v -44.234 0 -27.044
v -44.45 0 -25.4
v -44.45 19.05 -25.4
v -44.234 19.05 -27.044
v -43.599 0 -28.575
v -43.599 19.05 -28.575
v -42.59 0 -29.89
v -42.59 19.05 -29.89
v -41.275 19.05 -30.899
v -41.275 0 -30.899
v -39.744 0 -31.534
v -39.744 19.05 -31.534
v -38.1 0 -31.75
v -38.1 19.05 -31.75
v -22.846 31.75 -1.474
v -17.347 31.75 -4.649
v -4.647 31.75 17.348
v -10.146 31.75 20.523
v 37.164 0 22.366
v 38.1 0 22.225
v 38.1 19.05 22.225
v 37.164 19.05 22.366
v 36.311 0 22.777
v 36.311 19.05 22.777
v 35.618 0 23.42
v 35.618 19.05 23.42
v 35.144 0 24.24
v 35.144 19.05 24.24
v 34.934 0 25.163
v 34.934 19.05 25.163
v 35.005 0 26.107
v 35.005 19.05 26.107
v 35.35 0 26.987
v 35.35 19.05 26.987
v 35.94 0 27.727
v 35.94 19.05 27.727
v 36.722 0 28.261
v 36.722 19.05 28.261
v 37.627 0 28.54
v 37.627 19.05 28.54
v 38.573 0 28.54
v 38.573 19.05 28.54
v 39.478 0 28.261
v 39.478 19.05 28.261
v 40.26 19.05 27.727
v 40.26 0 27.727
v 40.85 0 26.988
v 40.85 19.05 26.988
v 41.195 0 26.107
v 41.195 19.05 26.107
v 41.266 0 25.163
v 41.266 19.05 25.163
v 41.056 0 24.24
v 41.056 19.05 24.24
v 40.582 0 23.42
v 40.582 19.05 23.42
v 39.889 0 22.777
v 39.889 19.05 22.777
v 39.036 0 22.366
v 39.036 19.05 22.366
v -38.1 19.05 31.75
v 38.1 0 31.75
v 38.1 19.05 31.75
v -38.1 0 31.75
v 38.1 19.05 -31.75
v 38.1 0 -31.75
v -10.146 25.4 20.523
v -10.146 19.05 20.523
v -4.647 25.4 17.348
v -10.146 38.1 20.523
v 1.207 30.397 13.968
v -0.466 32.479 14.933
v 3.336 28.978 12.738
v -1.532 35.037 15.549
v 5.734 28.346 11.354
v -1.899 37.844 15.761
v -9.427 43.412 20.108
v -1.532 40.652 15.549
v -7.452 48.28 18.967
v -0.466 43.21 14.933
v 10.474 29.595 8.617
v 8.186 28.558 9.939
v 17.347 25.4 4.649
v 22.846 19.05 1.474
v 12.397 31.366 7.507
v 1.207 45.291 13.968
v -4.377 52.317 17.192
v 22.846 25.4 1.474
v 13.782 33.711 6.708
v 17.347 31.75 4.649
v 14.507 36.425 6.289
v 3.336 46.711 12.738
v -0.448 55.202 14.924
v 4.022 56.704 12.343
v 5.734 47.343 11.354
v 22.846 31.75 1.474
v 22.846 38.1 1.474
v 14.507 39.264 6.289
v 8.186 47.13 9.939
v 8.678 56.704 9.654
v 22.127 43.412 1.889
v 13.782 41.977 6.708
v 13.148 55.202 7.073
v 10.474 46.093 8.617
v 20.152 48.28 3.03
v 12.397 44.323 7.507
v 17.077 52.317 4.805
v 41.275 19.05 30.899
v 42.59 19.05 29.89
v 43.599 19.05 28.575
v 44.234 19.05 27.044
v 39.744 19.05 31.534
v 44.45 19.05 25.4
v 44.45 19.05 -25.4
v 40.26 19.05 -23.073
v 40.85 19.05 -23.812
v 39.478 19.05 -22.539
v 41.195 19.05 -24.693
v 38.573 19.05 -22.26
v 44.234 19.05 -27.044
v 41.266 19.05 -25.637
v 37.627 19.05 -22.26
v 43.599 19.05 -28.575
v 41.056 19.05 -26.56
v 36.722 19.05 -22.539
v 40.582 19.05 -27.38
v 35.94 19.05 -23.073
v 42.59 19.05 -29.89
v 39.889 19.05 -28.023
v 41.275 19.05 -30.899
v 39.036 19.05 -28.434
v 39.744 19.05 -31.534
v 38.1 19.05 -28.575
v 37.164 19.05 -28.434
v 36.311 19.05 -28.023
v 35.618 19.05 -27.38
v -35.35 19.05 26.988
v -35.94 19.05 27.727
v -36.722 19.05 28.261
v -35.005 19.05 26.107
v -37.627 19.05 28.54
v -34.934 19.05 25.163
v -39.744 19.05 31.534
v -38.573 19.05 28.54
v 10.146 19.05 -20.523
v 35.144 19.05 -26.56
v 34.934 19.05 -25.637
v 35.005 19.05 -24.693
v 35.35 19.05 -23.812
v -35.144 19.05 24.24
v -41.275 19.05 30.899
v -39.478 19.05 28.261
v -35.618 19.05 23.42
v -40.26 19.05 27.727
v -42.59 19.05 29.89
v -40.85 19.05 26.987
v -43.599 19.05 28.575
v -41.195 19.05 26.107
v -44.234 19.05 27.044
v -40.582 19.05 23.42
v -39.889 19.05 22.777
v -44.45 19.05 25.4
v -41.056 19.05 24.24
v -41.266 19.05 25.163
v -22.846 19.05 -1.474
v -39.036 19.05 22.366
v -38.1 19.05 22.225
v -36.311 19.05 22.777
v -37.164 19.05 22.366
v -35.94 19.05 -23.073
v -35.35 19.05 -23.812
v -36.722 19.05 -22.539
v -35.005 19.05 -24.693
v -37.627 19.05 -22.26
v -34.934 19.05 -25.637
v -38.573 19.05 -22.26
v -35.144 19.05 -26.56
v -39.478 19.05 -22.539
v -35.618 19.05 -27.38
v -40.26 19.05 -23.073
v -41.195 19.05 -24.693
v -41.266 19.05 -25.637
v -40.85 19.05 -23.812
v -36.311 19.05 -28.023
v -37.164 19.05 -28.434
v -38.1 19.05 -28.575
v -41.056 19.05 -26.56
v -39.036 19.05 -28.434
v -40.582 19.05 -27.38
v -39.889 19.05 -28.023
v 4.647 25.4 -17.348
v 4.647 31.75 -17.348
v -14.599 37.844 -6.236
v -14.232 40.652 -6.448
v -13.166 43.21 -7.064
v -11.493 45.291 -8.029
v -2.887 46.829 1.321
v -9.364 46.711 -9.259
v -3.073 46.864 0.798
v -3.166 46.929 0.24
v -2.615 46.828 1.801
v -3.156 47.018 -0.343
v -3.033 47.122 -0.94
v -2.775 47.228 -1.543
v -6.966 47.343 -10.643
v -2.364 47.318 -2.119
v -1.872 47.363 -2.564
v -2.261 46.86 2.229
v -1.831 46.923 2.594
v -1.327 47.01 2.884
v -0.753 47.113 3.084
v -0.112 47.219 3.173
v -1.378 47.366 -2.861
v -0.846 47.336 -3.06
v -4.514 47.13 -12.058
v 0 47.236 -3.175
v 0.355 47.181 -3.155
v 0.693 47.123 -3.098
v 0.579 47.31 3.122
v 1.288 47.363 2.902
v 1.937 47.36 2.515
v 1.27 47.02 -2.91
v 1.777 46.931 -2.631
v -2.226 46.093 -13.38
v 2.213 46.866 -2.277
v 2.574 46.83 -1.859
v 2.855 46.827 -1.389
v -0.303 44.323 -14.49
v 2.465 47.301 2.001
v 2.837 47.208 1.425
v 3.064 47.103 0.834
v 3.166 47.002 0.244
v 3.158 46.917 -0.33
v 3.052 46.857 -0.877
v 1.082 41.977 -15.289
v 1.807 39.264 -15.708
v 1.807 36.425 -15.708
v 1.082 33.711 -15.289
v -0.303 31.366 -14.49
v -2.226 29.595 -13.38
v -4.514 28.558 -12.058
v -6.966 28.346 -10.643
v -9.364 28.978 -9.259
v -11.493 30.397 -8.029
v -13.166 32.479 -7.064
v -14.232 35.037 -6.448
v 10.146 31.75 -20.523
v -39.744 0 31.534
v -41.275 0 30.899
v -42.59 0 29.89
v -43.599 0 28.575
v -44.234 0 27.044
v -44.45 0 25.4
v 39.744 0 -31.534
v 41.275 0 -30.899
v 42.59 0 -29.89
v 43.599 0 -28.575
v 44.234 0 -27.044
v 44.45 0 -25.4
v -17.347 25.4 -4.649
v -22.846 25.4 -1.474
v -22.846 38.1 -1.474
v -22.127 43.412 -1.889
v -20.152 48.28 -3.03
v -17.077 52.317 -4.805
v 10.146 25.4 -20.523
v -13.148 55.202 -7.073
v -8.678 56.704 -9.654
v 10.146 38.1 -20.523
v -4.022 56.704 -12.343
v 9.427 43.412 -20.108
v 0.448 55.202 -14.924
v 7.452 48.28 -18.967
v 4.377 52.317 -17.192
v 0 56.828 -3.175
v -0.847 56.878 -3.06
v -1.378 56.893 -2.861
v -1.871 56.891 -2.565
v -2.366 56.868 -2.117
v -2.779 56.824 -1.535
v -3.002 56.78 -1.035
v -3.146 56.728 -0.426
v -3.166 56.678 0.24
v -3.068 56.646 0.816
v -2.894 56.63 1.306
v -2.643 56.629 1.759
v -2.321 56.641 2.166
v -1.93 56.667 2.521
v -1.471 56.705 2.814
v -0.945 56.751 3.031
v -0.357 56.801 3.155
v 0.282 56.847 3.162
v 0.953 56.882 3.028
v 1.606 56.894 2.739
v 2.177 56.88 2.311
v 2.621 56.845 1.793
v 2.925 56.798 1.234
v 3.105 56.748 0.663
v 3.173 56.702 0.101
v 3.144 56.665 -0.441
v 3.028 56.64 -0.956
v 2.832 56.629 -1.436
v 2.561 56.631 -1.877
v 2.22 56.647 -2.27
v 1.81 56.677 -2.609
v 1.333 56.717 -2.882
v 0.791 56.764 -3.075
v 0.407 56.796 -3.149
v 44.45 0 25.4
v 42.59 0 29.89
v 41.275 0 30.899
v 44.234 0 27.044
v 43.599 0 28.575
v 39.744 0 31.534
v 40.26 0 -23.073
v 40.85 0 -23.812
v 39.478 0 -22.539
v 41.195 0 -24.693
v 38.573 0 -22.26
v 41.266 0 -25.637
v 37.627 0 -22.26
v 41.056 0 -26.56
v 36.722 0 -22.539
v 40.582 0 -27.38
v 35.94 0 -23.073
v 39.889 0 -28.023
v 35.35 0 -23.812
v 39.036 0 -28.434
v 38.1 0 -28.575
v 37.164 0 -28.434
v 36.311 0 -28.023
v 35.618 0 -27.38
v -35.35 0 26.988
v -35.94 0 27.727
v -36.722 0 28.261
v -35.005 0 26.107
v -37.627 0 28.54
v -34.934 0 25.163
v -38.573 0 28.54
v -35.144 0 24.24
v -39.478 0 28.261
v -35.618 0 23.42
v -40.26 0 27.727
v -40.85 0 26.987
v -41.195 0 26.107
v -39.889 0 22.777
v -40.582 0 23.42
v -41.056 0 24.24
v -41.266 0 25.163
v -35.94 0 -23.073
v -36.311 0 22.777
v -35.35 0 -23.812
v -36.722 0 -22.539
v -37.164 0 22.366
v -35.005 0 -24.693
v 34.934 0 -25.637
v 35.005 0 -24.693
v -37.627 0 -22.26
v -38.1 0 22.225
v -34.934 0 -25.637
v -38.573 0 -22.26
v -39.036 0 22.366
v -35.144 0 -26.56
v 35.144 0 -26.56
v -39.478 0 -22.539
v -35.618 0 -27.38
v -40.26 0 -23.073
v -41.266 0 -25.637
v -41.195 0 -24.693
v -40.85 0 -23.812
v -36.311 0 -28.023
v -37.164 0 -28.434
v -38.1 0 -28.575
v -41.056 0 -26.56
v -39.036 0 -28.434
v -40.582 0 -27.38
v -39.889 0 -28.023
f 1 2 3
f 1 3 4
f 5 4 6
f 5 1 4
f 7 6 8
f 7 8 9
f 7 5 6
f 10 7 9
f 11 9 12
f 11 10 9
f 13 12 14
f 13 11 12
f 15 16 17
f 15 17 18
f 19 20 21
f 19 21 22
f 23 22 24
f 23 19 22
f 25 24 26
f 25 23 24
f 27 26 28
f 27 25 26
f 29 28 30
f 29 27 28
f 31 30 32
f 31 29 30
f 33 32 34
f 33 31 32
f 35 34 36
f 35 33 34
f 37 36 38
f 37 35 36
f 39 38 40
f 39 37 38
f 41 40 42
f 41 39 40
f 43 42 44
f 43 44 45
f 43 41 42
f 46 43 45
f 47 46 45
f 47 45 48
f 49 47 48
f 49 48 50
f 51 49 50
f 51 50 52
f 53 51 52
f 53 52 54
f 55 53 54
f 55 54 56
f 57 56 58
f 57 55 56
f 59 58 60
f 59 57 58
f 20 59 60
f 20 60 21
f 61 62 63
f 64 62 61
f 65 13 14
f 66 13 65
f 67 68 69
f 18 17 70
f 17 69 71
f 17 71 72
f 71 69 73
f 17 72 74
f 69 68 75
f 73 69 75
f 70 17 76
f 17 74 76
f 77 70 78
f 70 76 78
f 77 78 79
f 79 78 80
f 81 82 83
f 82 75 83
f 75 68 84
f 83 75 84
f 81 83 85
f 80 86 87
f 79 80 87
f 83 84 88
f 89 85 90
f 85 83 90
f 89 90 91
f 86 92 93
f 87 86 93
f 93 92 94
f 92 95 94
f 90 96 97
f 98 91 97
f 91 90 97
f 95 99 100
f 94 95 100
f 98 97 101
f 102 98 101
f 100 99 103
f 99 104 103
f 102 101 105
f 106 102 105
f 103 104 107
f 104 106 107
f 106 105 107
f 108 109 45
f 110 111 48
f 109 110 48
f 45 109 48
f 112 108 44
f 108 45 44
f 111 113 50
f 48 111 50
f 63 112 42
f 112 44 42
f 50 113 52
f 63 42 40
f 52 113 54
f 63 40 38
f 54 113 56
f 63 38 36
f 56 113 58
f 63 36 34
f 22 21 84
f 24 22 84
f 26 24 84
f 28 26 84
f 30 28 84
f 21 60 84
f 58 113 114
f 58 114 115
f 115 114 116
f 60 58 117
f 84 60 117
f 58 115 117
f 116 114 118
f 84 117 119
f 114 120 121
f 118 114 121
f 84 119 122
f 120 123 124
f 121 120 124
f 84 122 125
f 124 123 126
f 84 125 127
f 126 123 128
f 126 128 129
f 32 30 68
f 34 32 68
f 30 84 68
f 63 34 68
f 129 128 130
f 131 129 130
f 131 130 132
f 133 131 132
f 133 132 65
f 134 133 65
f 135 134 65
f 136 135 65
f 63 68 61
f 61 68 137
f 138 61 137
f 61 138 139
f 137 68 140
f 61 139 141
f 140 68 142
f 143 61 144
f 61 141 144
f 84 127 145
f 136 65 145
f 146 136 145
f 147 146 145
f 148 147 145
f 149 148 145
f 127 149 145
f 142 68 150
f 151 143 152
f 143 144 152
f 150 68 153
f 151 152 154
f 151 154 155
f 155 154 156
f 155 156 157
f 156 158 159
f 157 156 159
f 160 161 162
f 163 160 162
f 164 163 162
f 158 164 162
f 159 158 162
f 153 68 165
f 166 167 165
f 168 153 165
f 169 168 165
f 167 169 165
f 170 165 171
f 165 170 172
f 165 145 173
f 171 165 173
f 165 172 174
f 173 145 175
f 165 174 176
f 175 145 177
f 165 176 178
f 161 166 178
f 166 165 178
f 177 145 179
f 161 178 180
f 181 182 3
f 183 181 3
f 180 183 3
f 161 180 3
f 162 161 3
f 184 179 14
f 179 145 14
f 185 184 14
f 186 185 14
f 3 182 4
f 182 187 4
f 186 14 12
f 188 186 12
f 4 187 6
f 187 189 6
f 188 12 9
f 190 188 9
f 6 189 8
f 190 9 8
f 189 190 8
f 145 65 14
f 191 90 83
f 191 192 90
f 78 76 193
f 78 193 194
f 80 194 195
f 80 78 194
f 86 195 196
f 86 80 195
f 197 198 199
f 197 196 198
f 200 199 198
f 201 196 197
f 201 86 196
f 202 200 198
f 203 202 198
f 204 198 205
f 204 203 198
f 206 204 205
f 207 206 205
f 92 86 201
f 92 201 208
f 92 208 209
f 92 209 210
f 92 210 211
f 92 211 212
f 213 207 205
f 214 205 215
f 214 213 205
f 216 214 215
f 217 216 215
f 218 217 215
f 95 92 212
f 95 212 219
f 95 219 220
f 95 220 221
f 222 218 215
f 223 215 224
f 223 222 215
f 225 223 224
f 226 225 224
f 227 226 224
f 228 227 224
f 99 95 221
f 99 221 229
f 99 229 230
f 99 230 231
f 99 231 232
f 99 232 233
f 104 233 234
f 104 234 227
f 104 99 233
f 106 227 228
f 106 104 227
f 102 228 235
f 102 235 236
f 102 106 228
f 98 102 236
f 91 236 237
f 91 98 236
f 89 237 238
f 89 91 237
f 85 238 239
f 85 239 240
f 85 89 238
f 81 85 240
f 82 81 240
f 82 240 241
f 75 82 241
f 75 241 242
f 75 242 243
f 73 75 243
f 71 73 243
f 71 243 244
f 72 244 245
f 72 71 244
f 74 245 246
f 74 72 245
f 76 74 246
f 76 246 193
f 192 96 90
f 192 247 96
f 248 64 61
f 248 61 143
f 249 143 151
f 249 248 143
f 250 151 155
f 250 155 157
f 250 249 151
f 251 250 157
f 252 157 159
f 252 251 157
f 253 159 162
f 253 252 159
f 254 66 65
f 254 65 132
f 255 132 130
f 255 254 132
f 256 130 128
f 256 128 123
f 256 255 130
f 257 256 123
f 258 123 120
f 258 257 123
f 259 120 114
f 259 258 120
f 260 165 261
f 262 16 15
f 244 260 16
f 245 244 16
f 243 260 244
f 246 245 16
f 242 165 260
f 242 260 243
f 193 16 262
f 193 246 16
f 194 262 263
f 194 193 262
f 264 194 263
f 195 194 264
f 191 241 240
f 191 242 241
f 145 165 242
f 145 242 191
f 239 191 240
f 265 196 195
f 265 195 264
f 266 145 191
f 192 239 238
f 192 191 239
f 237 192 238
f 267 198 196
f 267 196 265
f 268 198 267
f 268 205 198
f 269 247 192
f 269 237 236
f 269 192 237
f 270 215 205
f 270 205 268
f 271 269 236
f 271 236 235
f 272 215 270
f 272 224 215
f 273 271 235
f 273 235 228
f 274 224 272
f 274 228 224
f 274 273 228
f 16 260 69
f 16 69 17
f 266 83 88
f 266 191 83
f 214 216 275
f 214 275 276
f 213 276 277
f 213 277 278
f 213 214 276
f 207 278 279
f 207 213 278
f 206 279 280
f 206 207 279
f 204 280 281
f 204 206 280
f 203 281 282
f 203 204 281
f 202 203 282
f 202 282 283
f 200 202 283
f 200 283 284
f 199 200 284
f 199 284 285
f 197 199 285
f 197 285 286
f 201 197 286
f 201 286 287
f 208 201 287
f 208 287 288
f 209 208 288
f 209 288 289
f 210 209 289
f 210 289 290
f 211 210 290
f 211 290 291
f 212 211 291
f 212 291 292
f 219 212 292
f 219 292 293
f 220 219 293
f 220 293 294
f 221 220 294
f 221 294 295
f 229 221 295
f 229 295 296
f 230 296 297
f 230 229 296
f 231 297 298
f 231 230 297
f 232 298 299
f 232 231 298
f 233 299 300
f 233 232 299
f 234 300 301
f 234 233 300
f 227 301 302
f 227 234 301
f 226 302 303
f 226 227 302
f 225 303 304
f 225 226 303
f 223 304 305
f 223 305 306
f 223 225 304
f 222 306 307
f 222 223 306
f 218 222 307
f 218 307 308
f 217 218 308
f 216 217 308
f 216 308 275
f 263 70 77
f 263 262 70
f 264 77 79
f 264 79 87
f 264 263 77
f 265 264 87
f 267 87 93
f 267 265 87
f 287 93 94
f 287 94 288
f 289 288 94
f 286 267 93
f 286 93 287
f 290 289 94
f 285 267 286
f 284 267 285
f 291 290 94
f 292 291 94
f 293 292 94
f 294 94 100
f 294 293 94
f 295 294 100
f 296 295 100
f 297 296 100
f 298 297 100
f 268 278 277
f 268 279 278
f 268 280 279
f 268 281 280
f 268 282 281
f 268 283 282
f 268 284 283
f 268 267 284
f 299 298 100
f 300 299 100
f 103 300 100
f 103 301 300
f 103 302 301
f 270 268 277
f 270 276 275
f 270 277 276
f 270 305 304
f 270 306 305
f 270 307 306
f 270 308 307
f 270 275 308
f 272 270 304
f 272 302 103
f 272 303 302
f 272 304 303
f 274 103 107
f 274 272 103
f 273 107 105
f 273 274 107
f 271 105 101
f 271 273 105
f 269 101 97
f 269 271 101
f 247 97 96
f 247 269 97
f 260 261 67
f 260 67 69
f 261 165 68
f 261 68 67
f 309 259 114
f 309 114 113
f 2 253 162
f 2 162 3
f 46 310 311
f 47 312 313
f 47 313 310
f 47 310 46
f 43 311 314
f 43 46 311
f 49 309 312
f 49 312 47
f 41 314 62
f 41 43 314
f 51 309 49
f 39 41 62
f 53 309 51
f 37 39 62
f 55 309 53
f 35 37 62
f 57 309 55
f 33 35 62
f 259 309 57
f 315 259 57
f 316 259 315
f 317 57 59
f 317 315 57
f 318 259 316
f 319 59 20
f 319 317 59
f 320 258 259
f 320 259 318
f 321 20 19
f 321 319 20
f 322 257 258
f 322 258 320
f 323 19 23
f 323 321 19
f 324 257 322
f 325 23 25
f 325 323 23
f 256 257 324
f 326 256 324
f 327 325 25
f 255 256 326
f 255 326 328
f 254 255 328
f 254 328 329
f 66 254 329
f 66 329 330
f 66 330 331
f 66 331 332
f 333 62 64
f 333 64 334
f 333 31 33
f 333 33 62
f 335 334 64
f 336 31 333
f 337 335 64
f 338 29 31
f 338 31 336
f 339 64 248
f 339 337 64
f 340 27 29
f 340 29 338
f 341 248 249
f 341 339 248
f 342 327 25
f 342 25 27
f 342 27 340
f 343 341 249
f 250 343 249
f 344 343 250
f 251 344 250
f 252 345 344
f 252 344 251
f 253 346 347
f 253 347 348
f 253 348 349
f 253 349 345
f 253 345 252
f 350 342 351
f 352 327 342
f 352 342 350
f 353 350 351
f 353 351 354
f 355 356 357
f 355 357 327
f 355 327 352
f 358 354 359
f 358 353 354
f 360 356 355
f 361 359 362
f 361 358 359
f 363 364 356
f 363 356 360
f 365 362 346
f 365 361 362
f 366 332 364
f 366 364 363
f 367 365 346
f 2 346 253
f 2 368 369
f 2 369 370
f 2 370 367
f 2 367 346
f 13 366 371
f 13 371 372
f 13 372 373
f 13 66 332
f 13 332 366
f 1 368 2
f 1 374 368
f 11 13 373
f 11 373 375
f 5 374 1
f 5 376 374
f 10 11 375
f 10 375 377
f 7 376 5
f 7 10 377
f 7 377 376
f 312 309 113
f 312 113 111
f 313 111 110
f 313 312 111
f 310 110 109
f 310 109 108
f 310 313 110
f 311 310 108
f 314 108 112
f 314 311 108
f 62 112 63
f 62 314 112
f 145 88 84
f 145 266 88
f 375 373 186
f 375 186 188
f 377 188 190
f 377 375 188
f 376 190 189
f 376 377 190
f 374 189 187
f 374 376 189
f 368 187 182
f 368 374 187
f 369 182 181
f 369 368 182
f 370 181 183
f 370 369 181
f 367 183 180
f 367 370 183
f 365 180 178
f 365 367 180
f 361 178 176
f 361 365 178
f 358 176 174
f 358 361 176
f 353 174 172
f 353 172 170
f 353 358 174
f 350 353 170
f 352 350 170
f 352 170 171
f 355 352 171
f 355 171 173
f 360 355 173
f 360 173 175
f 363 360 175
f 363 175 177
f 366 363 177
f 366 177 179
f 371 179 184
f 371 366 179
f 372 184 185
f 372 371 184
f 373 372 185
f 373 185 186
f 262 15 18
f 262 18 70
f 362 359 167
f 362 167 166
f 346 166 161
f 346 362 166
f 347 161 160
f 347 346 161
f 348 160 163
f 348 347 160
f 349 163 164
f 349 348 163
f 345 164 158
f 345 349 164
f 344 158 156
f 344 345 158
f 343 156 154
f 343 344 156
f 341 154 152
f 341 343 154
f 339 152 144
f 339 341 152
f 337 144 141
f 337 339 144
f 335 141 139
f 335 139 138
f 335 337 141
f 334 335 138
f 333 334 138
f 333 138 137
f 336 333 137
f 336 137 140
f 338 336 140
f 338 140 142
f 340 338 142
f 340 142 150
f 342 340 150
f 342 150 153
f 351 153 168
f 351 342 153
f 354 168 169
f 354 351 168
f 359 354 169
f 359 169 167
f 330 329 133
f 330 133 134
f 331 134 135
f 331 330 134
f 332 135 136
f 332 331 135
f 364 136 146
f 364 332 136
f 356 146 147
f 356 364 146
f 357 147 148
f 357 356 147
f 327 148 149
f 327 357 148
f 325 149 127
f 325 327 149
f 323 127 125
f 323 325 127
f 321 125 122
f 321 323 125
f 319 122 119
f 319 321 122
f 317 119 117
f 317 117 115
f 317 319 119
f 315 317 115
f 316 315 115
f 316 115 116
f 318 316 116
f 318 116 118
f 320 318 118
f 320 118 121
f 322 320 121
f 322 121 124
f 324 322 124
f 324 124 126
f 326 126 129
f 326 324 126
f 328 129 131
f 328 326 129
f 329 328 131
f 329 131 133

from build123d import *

# Parameters (mm, degrees)
SKETCH1_R           = 3.175
BOSS_EXTRUDE1_DEPTH = 19.05
SKETCH3_R           = 9.525
BOSS_EXTRUDE2_DEPTH = 12.7
SKETCH4_R           = 3.175
CUT_EXTRUDE1_DEPTH  = 67.599361859


with BuildPart() as part:
    # Sketch1 → Boss-Extrude1 (new body)
    with BuildSketch(Plane(origin=(0, 0, 0), x_dir=(1, 0, 0), z_dir=(0, 1, 0))):
        with BuildLine():
            Line((-38.1, 31.75), (38.1, 31.75))
            ThreePointArc((38.1, 31.75), (42.590128061, 29.890128061), (44.45, 25.4))
            Line((44.45, 25.4), (44.45, -25.4))
            ThreePointArc((44.45, -25.4), (42.590128061, -29.890128061), (38.1, -31.75))
            Line((38.1, -31.75), (-38.1, -31.75))
            ThreePointArc((-38.1, -31.75), (-42.590128061, -29.890128061), (-44.45, -25.4))
            Line((-44.45, -25.4), (-44.45, 25.4))
            ThreePointArc((-44.45, 25.4), (-42.590128061, 29.890128061), (-38.1, 31.75))
        make_face()
        with Locations((-38.1, 25.4)):
            Circle(SKETCH1_R, mode=Mode.SUBTRACT)
        with Locations((-38.1, -25.4)):
            Circle(SKETCH1_R, mode=Mode.SUBTRACT)
        with Locations((38.1, -25.4)):
            Circle(SKETCH1_R, mode=Mode.SUBTRACT)
        with Locations((38.1, 25.4)):
            Circle(SKETCH1_R, mode=Mode.SUBTRACT)
    extrude(amount=BOSS_EXTRUDE1_DEPTH)

    # Sketch3 → Boss-Extrude2 (add, symmetric)
    with BuildSketch(Plane(origin=(0, 0, 0), x_dir=(0, 1, 0), z_dir=(-0.500000000000001, 0, -0.866025403784438))):
        with BuildLine():
            Line((25.4, 19.048282487), (19.05, 19.048282487))
            Line((19.05, 19.048282487), (19.05, 17.120567884))
            Line((19.05, 17.120567884), (19.05, -19.048282487))
            Line((19.05, -19.048282487), (25.4, -19.048282487))
            Line((25.4, -19.048282487), (25.4, -12.698282487))
            Line((25.4, -12.698282487), (31.75, -12.698282487))
            Line((31.75, -12.698282487), (31.75, -19.048282487))
            Line((31.75, -19.048282487), (38.1, -19.048282487))
            ThreePointArc((38.1, -19.048282487), (56.894198738, 0), (38.1, 19.048282487))
            Line((38.1, 19.048282487), (31.75, 19.048282487))
            Line((31.75, 19.048282487), (31.75, 12.698282487))
            Line((31.75, 12.698282487), (25.4, 12.698282487))
            Line((25.4, 12.698282487), (25.4, 19.048282487))
        make_face()
        with Locations((37.844198738, 0)):
            Circle(SKETCH3_R, mode=Mode.SUBTRACT)
    extrude(amount=BOSS_EXTRUDE2_DEPTH, both=True)

    # Sketch4 → Cut-Extrude1 (cut, through all)
    with BuildSketch(Plane(origin=(0, 38.1, 0), x_dir=(1, 0, 0), z_dir=(0, 1, 0))):
        Circle(SKETCH4_R)
    extrude(amount=CUT_EXTRUDE1_DEPTH, mode=Mode.SUBTRACT)


solid = part.part
